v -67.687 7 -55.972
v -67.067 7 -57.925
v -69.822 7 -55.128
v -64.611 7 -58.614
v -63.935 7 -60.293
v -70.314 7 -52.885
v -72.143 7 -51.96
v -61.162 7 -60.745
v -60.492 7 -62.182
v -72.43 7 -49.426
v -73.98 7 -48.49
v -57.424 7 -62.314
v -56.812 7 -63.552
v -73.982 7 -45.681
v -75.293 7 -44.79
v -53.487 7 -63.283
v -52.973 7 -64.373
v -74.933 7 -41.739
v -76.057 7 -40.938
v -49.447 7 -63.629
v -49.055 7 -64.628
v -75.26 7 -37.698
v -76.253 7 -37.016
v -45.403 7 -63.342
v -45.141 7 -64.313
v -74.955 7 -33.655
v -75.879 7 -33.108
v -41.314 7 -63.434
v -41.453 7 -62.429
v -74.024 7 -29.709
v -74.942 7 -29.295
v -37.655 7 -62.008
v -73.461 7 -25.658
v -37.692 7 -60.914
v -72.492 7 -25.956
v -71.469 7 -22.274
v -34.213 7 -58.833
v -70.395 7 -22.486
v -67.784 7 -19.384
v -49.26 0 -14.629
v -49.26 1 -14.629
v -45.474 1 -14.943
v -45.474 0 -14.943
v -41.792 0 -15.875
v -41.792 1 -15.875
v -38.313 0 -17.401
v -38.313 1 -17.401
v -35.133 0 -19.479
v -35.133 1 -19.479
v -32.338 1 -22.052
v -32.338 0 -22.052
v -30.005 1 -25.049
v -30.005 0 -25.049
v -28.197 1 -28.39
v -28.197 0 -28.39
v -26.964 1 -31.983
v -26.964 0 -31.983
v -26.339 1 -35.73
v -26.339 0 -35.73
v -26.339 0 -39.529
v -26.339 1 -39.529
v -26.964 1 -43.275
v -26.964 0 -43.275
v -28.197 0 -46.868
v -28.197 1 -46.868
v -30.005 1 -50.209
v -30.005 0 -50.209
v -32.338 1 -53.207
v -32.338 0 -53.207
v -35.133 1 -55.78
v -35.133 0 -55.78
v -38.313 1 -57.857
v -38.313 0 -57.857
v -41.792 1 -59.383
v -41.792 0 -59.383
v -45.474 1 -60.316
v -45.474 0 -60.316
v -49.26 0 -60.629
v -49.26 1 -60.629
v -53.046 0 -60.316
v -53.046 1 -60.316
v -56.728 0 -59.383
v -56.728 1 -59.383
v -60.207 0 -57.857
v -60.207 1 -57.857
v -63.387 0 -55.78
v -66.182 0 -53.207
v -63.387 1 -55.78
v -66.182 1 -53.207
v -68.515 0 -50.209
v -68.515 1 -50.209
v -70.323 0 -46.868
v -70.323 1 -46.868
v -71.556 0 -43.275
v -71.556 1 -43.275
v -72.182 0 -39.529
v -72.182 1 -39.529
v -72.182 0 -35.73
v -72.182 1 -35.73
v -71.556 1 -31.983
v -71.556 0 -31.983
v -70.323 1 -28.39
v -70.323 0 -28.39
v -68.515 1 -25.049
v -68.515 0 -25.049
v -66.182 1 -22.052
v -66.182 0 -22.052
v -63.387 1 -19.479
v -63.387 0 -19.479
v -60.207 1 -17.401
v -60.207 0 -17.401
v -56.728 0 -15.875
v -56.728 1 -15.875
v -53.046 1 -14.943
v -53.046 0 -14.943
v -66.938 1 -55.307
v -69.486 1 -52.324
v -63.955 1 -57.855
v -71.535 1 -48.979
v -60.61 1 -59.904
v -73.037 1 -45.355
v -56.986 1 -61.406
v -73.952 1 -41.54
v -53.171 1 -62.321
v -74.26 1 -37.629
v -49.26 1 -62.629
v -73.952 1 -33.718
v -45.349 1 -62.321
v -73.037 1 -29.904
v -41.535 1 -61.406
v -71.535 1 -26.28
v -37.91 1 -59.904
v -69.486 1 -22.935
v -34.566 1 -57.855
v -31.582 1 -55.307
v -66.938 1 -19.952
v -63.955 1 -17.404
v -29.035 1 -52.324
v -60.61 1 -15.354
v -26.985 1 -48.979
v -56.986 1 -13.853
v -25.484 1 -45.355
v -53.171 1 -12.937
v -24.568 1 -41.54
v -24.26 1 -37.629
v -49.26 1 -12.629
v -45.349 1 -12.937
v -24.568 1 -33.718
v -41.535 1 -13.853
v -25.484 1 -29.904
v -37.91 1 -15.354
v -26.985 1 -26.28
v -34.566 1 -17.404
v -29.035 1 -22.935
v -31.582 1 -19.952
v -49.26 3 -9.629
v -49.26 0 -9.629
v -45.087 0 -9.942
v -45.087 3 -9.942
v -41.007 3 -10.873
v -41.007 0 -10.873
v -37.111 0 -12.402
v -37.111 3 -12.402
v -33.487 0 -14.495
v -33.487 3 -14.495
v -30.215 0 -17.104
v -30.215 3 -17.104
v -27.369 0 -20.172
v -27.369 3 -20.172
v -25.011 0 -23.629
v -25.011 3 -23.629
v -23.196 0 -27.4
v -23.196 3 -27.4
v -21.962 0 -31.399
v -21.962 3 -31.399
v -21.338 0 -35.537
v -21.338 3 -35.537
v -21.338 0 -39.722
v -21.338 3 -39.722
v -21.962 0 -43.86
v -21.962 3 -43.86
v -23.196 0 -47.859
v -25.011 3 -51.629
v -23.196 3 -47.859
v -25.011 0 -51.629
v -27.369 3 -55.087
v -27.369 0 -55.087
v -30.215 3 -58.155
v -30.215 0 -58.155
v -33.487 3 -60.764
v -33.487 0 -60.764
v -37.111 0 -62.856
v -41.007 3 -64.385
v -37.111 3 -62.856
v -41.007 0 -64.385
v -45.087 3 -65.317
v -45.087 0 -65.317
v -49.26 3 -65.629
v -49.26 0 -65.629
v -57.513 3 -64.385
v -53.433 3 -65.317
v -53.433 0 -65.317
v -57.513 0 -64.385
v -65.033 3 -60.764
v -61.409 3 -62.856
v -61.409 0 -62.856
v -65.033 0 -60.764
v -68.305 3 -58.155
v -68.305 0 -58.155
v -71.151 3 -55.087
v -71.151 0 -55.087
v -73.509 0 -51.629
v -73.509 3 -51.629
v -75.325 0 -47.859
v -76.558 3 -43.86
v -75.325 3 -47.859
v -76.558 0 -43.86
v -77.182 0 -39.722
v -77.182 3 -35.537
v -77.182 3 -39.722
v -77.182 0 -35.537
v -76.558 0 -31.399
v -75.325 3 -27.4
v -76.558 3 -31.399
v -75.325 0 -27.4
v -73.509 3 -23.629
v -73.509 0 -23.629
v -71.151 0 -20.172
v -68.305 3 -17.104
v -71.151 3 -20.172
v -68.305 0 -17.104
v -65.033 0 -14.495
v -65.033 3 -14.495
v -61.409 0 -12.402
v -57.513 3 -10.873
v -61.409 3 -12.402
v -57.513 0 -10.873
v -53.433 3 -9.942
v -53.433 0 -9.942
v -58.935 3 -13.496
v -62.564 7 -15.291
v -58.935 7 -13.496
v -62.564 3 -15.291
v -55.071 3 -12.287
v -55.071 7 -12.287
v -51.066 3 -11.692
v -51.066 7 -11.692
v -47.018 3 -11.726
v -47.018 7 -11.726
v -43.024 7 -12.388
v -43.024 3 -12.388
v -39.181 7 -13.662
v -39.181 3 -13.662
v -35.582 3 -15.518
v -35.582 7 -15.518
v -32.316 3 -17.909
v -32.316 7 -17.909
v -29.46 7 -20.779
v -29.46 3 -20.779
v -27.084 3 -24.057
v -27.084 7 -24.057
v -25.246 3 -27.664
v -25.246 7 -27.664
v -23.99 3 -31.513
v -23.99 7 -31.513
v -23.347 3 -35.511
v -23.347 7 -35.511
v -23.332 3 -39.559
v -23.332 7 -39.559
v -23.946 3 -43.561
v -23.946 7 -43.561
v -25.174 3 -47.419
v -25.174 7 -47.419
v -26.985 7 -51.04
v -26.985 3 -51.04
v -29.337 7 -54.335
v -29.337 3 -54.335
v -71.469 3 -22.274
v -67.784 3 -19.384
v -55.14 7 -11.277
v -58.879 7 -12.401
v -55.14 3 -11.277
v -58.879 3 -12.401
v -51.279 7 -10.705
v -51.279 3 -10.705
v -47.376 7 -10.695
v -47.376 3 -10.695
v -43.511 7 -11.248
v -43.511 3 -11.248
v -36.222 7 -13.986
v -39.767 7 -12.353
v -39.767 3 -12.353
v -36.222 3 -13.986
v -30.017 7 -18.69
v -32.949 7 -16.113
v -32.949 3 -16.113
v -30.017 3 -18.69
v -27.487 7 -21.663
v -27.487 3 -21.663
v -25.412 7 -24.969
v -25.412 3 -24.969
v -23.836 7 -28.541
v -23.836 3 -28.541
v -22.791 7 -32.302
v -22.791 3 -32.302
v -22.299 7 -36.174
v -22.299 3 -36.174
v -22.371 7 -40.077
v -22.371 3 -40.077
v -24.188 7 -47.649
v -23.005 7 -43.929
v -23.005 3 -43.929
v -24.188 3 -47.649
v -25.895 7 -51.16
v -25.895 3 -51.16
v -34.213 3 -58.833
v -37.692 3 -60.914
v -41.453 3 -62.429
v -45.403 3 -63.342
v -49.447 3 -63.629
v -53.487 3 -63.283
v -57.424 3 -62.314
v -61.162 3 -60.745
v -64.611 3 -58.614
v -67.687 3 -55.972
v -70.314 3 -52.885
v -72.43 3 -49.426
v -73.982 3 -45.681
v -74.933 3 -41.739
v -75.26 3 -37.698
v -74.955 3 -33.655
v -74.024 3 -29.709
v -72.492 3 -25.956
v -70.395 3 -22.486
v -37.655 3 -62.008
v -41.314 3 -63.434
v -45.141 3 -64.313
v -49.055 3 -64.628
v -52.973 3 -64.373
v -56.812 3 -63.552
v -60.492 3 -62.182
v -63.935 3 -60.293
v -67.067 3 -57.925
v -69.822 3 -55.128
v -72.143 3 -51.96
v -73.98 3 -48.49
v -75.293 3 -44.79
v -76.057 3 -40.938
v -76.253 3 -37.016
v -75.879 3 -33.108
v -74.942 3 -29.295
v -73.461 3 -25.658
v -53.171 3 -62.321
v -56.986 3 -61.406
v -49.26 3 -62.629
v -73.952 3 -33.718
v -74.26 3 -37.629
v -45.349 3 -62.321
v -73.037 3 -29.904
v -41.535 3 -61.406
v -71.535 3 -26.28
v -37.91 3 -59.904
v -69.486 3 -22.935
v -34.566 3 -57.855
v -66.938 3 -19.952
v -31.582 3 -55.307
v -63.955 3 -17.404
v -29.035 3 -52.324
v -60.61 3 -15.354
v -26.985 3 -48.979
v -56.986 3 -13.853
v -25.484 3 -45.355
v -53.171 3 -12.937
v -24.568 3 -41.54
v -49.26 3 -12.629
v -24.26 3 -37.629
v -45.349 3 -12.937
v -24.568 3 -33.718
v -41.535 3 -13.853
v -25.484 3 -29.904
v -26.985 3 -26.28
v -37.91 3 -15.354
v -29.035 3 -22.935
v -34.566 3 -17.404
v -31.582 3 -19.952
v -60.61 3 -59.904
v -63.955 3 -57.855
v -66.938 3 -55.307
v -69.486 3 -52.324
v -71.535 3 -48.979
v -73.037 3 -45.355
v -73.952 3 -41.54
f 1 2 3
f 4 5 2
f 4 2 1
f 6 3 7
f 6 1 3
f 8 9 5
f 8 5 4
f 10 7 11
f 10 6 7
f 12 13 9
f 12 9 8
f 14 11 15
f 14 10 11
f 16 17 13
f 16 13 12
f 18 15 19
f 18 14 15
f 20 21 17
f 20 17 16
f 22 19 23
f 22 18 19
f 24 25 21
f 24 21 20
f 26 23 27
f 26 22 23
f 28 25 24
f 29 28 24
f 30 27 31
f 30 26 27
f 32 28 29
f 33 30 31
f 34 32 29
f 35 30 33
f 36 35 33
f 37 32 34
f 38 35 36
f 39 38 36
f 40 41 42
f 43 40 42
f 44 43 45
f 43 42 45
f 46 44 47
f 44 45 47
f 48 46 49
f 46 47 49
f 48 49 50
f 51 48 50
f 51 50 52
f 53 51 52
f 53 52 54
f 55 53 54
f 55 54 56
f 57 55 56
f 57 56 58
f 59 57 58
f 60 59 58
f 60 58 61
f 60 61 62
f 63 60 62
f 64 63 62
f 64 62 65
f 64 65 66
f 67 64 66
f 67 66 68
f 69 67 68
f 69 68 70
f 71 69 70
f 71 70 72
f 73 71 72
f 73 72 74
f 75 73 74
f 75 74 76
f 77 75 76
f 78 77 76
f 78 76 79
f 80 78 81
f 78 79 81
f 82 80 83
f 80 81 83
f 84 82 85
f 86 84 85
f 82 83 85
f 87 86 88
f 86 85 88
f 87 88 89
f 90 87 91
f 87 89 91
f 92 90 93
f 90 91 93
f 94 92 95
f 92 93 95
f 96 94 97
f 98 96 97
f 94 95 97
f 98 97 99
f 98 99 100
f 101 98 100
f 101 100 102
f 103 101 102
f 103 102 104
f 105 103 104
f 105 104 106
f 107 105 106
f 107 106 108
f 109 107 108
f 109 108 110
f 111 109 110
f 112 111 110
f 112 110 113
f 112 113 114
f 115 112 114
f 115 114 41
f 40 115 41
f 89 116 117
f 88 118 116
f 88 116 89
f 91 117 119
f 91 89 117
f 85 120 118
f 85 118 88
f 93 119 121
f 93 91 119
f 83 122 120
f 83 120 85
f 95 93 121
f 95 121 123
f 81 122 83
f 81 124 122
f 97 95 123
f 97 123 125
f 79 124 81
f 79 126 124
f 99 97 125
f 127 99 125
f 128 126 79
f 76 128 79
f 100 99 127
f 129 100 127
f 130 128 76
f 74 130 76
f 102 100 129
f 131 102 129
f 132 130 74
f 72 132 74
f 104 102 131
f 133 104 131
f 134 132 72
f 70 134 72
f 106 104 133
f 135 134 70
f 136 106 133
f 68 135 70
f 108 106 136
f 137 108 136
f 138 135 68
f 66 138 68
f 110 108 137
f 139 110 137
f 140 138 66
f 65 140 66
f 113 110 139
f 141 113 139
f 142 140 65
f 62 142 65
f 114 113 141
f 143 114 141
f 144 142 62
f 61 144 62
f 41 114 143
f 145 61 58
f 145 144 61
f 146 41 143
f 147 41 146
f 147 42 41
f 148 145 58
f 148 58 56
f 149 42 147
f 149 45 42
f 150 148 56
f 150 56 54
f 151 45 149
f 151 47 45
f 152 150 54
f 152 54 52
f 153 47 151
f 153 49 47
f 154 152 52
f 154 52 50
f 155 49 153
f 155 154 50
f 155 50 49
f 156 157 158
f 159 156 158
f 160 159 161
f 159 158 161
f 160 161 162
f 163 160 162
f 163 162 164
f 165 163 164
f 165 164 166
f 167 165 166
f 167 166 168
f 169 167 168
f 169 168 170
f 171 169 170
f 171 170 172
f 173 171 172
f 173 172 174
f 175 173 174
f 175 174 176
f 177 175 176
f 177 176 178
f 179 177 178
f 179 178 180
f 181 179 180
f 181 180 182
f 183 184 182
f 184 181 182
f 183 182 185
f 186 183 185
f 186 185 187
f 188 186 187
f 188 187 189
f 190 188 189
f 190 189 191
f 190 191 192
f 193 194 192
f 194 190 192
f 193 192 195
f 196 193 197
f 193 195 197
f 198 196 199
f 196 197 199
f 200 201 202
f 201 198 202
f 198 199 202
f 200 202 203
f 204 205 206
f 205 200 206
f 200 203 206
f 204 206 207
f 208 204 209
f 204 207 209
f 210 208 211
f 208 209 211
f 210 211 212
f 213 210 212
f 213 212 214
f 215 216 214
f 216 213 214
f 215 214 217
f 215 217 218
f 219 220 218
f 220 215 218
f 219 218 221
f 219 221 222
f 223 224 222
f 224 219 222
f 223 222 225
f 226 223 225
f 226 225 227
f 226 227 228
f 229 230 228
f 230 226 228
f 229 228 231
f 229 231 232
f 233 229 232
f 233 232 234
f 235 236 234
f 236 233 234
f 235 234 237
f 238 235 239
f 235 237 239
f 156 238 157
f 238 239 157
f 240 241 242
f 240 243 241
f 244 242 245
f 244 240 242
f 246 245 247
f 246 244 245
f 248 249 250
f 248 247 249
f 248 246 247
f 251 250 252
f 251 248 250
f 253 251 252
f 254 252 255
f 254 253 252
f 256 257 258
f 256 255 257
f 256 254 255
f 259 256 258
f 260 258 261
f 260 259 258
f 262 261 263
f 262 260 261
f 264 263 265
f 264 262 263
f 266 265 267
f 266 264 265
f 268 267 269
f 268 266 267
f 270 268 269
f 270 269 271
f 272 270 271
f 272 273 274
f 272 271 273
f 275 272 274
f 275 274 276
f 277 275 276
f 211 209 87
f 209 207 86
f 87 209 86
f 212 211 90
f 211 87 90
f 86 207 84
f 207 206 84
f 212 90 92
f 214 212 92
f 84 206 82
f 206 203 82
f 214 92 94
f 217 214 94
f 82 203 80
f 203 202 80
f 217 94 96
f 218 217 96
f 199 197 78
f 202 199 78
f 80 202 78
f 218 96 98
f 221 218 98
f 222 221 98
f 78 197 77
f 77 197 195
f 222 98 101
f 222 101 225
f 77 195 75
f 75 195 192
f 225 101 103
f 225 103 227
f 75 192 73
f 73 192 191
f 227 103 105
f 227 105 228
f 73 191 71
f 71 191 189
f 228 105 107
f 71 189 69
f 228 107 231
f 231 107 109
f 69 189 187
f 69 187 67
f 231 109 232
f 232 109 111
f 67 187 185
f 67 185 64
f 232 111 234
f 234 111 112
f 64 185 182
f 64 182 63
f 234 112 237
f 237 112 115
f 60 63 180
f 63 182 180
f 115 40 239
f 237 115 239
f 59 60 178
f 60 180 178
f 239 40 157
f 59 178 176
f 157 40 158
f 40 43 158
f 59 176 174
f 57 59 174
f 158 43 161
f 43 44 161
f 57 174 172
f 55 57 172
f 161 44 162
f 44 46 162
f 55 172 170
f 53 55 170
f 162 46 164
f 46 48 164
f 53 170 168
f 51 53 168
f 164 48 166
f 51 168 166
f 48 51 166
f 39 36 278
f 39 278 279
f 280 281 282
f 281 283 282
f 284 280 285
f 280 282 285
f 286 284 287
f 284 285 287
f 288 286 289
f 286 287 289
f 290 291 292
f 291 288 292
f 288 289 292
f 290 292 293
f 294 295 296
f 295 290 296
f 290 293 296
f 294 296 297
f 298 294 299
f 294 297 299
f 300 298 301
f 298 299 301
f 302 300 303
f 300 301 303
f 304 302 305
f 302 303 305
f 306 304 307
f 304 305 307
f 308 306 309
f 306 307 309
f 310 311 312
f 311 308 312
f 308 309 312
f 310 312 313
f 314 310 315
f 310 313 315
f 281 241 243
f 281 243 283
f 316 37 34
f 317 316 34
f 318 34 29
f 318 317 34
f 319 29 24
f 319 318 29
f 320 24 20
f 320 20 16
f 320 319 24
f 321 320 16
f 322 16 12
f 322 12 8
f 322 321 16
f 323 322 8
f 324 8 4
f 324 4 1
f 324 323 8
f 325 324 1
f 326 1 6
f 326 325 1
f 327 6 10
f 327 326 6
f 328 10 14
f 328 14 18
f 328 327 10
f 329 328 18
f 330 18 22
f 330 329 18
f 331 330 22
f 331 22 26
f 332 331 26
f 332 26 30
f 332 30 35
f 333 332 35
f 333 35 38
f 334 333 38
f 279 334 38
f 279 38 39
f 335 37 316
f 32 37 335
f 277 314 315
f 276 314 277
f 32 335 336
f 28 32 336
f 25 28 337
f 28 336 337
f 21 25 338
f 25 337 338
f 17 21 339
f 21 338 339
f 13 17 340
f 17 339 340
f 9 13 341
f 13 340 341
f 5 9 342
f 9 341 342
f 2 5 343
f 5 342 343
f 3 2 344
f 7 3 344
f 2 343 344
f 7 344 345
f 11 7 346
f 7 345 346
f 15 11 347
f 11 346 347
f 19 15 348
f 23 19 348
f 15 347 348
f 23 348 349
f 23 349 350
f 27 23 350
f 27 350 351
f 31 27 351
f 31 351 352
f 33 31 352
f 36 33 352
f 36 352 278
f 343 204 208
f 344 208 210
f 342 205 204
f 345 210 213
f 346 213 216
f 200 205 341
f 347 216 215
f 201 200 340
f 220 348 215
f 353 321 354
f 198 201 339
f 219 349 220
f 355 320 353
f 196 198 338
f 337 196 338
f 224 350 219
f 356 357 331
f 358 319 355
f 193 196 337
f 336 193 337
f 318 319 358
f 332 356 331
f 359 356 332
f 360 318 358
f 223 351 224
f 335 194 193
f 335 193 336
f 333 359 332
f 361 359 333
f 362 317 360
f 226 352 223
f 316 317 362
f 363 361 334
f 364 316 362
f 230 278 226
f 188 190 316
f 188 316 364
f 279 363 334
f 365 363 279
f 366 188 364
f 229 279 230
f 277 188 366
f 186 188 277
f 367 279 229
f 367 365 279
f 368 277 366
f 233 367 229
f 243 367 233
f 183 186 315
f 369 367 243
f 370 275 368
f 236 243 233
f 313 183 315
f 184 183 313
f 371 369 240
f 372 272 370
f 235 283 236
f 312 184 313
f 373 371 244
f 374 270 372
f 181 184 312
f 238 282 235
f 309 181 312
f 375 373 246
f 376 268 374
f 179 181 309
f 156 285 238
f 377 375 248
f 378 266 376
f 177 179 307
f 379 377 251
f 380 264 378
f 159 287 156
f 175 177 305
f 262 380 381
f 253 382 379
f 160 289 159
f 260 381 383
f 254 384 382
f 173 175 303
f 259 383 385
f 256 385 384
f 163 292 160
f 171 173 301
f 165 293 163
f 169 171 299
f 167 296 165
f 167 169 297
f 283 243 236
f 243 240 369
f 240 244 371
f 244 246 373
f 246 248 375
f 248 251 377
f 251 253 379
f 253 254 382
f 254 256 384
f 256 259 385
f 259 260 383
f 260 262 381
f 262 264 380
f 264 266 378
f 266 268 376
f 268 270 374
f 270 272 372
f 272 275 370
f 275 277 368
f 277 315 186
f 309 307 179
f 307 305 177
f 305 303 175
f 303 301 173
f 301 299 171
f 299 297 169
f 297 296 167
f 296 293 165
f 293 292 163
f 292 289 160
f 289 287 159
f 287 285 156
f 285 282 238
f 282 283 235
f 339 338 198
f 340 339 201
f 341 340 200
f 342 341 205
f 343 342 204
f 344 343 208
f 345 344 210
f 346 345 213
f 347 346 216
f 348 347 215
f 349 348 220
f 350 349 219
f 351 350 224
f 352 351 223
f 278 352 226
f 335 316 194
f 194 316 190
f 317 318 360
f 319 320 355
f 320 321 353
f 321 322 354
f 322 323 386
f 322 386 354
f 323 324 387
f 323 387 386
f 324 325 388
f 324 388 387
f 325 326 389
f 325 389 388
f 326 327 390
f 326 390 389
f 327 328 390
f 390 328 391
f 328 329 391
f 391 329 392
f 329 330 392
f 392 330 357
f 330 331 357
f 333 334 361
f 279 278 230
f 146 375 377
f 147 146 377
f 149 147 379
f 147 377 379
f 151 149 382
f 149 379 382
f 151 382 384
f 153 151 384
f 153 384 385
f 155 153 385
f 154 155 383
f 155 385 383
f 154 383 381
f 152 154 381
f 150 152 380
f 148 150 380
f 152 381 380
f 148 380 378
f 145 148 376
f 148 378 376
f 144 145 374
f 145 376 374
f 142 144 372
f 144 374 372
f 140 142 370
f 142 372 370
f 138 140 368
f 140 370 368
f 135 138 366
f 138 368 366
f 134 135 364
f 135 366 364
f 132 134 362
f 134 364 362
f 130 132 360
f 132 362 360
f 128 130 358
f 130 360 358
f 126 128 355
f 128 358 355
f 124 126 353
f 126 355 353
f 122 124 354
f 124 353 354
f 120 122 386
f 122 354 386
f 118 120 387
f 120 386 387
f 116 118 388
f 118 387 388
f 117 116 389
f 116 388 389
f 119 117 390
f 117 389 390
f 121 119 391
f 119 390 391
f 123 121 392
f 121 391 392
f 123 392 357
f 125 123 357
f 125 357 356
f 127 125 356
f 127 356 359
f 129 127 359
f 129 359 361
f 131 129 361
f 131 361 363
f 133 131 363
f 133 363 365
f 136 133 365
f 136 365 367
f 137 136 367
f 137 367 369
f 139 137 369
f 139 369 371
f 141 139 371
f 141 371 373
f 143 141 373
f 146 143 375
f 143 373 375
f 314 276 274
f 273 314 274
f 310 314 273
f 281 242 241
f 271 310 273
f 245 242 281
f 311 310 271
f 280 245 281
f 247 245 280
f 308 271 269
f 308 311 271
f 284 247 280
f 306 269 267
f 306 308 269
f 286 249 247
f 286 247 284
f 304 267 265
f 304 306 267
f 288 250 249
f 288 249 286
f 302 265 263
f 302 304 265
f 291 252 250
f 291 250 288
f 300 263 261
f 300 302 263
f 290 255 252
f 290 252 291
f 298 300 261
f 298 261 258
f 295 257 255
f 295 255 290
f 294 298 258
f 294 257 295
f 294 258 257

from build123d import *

# Parameters (mm, degrees)
ESQUISSE6_R             = 28
BOSS_EXTRU_3_DEPTH      = 3
ESQUISSE7_R             = 27
ESQUISSE7_R_2           = 26
BOSS_EXTRU_4_DEPTH      = 4
ESQUISSE8_R             = 25
ENL_V_MAT_EXTRU_2_DEPTH = 2
ESQUISSE9_R             = 23
ENL_V_MAT_EXTRU_3_DEPTH = 102.549659352
ENL_V_MAT_EXTRU_4_DEPTH = 4


with BuildPart() as part:
    # Esquisse6 → Boss.-Extru.3 (new body)
    with BuildSketch(Plane(origin=(0, 0, 0), x_dir=(1, 0, 0), z_dir=(0, 1, 0))):
        with Locations(Location((-49.260149918, 37.629281188, 0), (0, 0, 270))):
            Circle(ESQUISSE6_R)
    extrude(amount=BOSS_EXTRU_3_DEPTH)

    # Esquisse7 → Boss.-Extru.4 (add)
    with BuildSketch(Plane(origin=(0, 3, 0), x_dir=(1, 0, 0), z_dir=(0, 1, 0))):
        with Locations(Location((-49.260149918, 37.629281188, 0), (0, 0, 270))):
            Circle(ESQUISSE7_R)
        with Locations(Location((-49.260149918, 37.629281188, 0), (0, 0, 270))):
            Circle(ESQUISSE7_R_2, mode=Mode.SUBTRACT)
    extrude(amount=BOSS_EXTRU_4_DEPTH)

    # Esquisse8 → Enlèv. mat.-Extru.2 (cut)
    with BuildSketch(Plane(origin=(0, 3, 0), x_dir=(1, 0, 0), z_dir=(0, 1, 0))):
        with Locations(Location((-49.260149918, 37.629281188, 0), (0, 0, 270))):
            Circle(ESQUISSE8_R)
    extrude(amount=-ENL_V_MAT_EXTRU_2_DEPTH, mode=Mode.SUBTRACT)

    # Esquisse9 → Enlèv. mat.-Extru.3 (cut, through all)
    with BuildSketch(Plane(origin=(0, 1, 0), x_dir=(1, 0, 0), z_dir=(0, 1, 0))):
        with Locations(Location((-49.260149918, 37.629281188, 0), (0, 0, 270))):
            Circle(ESQUISSE9_R)
    extrude(amount=-ENL_V_MAT_EXTRU_3_DEPTH, mode=Mode.SUBTRACT)

    # Esquisse10 → Enlèv. mat.-Extru.4 (cut)
    with BuildSketch(Plane(origin=(0, 7, 0), x_dir=(1, 0, 0), z_dir=(0, 1, 0))):
        Polygon((-71.468932312, 22.27447788), (-58.878892443, 12.400730055), (-61.579583758, 8.957071992), (-74.169623626, 18.830819817), align=None)
        Polygon((-22.927613797, 54.376268132), (-25.894954155, 51.159529779), (-37.65537385, 62.00814852), (-34.688033492, 65.224886873), align=None)
    extrude(amount=-ENL_V_MAT_EXTRU_4_DEPTH, mode=Mode.SUBTRACT)


solid = part.part
